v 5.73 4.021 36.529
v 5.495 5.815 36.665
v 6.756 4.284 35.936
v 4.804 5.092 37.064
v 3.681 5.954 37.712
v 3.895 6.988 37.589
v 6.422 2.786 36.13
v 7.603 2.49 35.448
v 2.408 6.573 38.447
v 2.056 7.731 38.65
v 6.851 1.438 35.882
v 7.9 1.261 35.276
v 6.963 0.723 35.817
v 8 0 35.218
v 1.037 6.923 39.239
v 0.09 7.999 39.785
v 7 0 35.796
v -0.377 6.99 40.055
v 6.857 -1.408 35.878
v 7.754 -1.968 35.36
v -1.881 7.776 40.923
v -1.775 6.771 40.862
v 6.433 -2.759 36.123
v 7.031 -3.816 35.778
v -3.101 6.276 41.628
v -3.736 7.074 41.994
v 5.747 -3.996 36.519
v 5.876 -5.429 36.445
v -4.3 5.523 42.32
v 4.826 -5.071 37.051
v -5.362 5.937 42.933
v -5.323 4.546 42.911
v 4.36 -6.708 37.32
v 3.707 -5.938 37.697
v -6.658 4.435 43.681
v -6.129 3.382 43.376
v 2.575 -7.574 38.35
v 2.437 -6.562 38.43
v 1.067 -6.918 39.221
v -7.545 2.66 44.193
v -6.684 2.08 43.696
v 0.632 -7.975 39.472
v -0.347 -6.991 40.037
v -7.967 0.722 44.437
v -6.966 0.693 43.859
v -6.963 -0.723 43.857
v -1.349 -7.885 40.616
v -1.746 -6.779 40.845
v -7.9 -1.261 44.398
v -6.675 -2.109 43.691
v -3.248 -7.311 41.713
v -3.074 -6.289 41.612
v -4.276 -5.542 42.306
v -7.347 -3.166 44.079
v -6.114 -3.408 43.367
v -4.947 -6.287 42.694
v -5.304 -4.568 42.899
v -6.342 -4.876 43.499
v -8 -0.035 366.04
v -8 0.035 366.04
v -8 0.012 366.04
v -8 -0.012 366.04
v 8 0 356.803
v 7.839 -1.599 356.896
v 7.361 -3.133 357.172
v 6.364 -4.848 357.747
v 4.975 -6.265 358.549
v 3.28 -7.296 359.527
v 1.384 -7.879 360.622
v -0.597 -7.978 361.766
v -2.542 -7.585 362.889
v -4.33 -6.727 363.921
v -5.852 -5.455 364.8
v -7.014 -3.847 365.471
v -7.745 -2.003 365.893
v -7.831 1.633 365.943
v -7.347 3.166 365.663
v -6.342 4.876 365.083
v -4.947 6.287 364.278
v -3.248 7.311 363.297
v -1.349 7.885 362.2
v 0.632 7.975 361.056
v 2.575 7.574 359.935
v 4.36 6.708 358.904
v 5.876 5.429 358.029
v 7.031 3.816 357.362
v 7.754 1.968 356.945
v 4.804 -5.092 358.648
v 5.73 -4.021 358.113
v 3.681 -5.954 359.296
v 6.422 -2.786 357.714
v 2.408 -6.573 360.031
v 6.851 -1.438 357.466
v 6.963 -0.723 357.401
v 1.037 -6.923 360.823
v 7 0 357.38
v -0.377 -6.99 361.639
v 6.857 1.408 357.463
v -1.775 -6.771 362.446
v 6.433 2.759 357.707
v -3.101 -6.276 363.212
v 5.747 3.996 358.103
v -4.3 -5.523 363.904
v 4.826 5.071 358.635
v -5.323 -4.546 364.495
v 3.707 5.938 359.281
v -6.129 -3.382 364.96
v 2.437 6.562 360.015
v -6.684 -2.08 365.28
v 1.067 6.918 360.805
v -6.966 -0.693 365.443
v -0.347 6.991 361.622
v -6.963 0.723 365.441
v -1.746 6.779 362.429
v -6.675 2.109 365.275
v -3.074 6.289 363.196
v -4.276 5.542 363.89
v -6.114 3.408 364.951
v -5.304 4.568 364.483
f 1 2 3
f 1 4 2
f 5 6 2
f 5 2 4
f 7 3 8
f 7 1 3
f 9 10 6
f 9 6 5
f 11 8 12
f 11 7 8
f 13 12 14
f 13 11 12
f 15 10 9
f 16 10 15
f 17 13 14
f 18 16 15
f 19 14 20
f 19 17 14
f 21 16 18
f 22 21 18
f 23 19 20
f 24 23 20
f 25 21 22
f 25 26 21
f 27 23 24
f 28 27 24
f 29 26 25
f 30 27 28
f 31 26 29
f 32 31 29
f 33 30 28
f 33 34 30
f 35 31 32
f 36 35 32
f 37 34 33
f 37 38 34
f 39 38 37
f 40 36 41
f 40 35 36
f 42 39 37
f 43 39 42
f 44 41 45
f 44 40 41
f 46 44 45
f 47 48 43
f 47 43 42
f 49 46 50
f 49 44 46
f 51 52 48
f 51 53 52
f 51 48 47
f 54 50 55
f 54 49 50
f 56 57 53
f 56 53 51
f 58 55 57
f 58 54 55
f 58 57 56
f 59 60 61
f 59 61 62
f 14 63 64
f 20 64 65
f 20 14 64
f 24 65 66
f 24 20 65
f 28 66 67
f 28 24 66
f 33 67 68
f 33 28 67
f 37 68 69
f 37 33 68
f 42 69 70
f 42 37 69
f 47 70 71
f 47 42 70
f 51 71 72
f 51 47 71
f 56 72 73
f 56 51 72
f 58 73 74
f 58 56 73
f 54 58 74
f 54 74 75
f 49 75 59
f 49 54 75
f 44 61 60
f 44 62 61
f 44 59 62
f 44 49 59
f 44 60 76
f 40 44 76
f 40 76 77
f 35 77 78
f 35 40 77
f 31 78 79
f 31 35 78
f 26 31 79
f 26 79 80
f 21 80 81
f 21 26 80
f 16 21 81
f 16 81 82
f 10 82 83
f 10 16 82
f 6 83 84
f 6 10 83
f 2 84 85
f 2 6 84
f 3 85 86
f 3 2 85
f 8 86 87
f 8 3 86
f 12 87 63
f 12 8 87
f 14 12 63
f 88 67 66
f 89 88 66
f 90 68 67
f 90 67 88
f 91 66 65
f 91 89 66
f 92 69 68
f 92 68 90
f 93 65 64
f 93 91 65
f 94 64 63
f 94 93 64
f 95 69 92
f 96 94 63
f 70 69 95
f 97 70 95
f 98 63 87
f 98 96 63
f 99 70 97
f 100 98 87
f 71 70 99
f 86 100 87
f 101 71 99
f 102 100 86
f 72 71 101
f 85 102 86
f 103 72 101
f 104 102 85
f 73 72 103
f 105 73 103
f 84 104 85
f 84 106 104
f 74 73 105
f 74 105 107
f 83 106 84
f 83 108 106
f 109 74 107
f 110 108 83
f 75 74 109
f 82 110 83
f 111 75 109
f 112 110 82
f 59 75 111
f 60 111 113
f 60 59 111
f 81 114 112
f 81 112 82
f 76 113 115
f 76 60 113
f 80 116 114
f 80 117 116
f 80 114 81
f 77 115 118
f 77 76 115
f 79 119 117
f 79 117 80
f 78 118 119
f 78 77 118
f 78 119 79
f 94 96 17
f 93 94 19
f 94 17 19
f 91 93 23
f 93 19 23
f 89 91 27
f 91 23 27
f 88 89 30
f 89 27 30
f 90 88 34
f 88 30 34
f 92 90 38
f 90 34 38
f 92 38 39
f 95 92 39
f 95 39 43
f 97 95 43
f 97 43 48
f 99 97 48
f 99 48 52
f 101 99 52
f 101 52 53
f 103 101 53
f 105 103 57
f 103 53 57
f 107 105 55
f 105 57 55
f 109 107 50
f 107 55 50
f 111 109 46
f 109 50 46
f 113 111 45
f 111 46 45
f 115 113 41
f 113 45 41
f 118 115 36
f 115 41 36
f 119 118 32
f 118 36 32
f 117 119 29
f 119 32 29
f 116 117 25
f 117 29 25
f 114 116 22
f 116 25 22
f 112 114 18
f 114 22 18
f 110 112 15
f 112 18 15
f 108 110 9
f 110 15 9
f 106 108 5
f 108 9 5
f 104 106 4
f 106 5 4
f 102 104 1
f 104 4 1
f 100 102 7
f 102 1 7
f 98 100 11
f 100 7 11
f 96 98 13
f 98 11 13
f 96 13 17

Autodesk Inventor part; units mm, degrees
ref_plane "Начальная плоскость" through (0, 0, 35.2184) normal (0, 0, 1) x (1, 0, 0)
ref_plane "Конечная плоскость" through (0, 0, 366.0401) normal (0, 0, 1) x (1, 0, 0)
sketch "Эскиз" plane through (0, 0, 0) normal (0, 0, 1) x (1, 0, 0)
  circle A0 centre (0, 0) radius 7
  circle A1 centre (0, 0) radius 8
  dimension "d0" = 16
  dimension "d1" = 1
extrude "Тело" add sketch "Эскиз" along normal up to surface (330.8217 mm away) from surface at 35.2184
sketch "Sketch3" plane through (0, 0, 0) normal (0, 0, 1) x (1, 0, 0)
  line L0 (0, 0) -> (10, 0)
ref_plane "Work Plane3" through (0, 0, 0) normal (0, -1, 0) x (1, 0, 0)
sketch "Sketch4" plane through (0, 0, 0) normal (0, -1, 0) x (1, 0, 0)
  line L0 (-2, 35.2184) -> (12, 35.2184)
  line L1 (-2, 366.0401) -> (12, 366.0401)
  dimension "d7" = 330.8217
ref_plane "РабПлоскость4" through (-421.1389, 19.75, 604.566) normal (0.5, 0, 0.866) x (0.866, 0, -0.5)
split "Разделение1" plane through (-421.1389, 19.75, 604.566) removes the side toward (0.5, 0, 0.866)
ref_plane "РабПлоскость5" through (-13.9269, 193.75, 47.8779) normal (-0.5, 0, -0.866) x (-0.866, 0, 0.5)
split "Разделение2" plane through (-13.9269, 193.75, 47.8779) removes the side toward (-0.5, 0, -0.866)
equation "\"d0\" = G_H"
equation "\"d1\" = G_T"
equation "\"d2\" = G_L"
equation "\"G_H\" = 16"
equation "\"G_T\" = 1"
equation "\"G_L\" = d7"
equation "\"G_OFFSET_START\" = -35.21837"
equation "\"G_OFFSET_END\" = -72.74613"
equation "\"d4\" = -G_OFFSET_START"
equation "\"d5\" = G_OFFSET_END + B_L"
equation "\"B_L\" = 438.7862"
properties part number "Труба 16x1-330,82 ГОСТ 10704-91" material "Сталь, мягкая"
